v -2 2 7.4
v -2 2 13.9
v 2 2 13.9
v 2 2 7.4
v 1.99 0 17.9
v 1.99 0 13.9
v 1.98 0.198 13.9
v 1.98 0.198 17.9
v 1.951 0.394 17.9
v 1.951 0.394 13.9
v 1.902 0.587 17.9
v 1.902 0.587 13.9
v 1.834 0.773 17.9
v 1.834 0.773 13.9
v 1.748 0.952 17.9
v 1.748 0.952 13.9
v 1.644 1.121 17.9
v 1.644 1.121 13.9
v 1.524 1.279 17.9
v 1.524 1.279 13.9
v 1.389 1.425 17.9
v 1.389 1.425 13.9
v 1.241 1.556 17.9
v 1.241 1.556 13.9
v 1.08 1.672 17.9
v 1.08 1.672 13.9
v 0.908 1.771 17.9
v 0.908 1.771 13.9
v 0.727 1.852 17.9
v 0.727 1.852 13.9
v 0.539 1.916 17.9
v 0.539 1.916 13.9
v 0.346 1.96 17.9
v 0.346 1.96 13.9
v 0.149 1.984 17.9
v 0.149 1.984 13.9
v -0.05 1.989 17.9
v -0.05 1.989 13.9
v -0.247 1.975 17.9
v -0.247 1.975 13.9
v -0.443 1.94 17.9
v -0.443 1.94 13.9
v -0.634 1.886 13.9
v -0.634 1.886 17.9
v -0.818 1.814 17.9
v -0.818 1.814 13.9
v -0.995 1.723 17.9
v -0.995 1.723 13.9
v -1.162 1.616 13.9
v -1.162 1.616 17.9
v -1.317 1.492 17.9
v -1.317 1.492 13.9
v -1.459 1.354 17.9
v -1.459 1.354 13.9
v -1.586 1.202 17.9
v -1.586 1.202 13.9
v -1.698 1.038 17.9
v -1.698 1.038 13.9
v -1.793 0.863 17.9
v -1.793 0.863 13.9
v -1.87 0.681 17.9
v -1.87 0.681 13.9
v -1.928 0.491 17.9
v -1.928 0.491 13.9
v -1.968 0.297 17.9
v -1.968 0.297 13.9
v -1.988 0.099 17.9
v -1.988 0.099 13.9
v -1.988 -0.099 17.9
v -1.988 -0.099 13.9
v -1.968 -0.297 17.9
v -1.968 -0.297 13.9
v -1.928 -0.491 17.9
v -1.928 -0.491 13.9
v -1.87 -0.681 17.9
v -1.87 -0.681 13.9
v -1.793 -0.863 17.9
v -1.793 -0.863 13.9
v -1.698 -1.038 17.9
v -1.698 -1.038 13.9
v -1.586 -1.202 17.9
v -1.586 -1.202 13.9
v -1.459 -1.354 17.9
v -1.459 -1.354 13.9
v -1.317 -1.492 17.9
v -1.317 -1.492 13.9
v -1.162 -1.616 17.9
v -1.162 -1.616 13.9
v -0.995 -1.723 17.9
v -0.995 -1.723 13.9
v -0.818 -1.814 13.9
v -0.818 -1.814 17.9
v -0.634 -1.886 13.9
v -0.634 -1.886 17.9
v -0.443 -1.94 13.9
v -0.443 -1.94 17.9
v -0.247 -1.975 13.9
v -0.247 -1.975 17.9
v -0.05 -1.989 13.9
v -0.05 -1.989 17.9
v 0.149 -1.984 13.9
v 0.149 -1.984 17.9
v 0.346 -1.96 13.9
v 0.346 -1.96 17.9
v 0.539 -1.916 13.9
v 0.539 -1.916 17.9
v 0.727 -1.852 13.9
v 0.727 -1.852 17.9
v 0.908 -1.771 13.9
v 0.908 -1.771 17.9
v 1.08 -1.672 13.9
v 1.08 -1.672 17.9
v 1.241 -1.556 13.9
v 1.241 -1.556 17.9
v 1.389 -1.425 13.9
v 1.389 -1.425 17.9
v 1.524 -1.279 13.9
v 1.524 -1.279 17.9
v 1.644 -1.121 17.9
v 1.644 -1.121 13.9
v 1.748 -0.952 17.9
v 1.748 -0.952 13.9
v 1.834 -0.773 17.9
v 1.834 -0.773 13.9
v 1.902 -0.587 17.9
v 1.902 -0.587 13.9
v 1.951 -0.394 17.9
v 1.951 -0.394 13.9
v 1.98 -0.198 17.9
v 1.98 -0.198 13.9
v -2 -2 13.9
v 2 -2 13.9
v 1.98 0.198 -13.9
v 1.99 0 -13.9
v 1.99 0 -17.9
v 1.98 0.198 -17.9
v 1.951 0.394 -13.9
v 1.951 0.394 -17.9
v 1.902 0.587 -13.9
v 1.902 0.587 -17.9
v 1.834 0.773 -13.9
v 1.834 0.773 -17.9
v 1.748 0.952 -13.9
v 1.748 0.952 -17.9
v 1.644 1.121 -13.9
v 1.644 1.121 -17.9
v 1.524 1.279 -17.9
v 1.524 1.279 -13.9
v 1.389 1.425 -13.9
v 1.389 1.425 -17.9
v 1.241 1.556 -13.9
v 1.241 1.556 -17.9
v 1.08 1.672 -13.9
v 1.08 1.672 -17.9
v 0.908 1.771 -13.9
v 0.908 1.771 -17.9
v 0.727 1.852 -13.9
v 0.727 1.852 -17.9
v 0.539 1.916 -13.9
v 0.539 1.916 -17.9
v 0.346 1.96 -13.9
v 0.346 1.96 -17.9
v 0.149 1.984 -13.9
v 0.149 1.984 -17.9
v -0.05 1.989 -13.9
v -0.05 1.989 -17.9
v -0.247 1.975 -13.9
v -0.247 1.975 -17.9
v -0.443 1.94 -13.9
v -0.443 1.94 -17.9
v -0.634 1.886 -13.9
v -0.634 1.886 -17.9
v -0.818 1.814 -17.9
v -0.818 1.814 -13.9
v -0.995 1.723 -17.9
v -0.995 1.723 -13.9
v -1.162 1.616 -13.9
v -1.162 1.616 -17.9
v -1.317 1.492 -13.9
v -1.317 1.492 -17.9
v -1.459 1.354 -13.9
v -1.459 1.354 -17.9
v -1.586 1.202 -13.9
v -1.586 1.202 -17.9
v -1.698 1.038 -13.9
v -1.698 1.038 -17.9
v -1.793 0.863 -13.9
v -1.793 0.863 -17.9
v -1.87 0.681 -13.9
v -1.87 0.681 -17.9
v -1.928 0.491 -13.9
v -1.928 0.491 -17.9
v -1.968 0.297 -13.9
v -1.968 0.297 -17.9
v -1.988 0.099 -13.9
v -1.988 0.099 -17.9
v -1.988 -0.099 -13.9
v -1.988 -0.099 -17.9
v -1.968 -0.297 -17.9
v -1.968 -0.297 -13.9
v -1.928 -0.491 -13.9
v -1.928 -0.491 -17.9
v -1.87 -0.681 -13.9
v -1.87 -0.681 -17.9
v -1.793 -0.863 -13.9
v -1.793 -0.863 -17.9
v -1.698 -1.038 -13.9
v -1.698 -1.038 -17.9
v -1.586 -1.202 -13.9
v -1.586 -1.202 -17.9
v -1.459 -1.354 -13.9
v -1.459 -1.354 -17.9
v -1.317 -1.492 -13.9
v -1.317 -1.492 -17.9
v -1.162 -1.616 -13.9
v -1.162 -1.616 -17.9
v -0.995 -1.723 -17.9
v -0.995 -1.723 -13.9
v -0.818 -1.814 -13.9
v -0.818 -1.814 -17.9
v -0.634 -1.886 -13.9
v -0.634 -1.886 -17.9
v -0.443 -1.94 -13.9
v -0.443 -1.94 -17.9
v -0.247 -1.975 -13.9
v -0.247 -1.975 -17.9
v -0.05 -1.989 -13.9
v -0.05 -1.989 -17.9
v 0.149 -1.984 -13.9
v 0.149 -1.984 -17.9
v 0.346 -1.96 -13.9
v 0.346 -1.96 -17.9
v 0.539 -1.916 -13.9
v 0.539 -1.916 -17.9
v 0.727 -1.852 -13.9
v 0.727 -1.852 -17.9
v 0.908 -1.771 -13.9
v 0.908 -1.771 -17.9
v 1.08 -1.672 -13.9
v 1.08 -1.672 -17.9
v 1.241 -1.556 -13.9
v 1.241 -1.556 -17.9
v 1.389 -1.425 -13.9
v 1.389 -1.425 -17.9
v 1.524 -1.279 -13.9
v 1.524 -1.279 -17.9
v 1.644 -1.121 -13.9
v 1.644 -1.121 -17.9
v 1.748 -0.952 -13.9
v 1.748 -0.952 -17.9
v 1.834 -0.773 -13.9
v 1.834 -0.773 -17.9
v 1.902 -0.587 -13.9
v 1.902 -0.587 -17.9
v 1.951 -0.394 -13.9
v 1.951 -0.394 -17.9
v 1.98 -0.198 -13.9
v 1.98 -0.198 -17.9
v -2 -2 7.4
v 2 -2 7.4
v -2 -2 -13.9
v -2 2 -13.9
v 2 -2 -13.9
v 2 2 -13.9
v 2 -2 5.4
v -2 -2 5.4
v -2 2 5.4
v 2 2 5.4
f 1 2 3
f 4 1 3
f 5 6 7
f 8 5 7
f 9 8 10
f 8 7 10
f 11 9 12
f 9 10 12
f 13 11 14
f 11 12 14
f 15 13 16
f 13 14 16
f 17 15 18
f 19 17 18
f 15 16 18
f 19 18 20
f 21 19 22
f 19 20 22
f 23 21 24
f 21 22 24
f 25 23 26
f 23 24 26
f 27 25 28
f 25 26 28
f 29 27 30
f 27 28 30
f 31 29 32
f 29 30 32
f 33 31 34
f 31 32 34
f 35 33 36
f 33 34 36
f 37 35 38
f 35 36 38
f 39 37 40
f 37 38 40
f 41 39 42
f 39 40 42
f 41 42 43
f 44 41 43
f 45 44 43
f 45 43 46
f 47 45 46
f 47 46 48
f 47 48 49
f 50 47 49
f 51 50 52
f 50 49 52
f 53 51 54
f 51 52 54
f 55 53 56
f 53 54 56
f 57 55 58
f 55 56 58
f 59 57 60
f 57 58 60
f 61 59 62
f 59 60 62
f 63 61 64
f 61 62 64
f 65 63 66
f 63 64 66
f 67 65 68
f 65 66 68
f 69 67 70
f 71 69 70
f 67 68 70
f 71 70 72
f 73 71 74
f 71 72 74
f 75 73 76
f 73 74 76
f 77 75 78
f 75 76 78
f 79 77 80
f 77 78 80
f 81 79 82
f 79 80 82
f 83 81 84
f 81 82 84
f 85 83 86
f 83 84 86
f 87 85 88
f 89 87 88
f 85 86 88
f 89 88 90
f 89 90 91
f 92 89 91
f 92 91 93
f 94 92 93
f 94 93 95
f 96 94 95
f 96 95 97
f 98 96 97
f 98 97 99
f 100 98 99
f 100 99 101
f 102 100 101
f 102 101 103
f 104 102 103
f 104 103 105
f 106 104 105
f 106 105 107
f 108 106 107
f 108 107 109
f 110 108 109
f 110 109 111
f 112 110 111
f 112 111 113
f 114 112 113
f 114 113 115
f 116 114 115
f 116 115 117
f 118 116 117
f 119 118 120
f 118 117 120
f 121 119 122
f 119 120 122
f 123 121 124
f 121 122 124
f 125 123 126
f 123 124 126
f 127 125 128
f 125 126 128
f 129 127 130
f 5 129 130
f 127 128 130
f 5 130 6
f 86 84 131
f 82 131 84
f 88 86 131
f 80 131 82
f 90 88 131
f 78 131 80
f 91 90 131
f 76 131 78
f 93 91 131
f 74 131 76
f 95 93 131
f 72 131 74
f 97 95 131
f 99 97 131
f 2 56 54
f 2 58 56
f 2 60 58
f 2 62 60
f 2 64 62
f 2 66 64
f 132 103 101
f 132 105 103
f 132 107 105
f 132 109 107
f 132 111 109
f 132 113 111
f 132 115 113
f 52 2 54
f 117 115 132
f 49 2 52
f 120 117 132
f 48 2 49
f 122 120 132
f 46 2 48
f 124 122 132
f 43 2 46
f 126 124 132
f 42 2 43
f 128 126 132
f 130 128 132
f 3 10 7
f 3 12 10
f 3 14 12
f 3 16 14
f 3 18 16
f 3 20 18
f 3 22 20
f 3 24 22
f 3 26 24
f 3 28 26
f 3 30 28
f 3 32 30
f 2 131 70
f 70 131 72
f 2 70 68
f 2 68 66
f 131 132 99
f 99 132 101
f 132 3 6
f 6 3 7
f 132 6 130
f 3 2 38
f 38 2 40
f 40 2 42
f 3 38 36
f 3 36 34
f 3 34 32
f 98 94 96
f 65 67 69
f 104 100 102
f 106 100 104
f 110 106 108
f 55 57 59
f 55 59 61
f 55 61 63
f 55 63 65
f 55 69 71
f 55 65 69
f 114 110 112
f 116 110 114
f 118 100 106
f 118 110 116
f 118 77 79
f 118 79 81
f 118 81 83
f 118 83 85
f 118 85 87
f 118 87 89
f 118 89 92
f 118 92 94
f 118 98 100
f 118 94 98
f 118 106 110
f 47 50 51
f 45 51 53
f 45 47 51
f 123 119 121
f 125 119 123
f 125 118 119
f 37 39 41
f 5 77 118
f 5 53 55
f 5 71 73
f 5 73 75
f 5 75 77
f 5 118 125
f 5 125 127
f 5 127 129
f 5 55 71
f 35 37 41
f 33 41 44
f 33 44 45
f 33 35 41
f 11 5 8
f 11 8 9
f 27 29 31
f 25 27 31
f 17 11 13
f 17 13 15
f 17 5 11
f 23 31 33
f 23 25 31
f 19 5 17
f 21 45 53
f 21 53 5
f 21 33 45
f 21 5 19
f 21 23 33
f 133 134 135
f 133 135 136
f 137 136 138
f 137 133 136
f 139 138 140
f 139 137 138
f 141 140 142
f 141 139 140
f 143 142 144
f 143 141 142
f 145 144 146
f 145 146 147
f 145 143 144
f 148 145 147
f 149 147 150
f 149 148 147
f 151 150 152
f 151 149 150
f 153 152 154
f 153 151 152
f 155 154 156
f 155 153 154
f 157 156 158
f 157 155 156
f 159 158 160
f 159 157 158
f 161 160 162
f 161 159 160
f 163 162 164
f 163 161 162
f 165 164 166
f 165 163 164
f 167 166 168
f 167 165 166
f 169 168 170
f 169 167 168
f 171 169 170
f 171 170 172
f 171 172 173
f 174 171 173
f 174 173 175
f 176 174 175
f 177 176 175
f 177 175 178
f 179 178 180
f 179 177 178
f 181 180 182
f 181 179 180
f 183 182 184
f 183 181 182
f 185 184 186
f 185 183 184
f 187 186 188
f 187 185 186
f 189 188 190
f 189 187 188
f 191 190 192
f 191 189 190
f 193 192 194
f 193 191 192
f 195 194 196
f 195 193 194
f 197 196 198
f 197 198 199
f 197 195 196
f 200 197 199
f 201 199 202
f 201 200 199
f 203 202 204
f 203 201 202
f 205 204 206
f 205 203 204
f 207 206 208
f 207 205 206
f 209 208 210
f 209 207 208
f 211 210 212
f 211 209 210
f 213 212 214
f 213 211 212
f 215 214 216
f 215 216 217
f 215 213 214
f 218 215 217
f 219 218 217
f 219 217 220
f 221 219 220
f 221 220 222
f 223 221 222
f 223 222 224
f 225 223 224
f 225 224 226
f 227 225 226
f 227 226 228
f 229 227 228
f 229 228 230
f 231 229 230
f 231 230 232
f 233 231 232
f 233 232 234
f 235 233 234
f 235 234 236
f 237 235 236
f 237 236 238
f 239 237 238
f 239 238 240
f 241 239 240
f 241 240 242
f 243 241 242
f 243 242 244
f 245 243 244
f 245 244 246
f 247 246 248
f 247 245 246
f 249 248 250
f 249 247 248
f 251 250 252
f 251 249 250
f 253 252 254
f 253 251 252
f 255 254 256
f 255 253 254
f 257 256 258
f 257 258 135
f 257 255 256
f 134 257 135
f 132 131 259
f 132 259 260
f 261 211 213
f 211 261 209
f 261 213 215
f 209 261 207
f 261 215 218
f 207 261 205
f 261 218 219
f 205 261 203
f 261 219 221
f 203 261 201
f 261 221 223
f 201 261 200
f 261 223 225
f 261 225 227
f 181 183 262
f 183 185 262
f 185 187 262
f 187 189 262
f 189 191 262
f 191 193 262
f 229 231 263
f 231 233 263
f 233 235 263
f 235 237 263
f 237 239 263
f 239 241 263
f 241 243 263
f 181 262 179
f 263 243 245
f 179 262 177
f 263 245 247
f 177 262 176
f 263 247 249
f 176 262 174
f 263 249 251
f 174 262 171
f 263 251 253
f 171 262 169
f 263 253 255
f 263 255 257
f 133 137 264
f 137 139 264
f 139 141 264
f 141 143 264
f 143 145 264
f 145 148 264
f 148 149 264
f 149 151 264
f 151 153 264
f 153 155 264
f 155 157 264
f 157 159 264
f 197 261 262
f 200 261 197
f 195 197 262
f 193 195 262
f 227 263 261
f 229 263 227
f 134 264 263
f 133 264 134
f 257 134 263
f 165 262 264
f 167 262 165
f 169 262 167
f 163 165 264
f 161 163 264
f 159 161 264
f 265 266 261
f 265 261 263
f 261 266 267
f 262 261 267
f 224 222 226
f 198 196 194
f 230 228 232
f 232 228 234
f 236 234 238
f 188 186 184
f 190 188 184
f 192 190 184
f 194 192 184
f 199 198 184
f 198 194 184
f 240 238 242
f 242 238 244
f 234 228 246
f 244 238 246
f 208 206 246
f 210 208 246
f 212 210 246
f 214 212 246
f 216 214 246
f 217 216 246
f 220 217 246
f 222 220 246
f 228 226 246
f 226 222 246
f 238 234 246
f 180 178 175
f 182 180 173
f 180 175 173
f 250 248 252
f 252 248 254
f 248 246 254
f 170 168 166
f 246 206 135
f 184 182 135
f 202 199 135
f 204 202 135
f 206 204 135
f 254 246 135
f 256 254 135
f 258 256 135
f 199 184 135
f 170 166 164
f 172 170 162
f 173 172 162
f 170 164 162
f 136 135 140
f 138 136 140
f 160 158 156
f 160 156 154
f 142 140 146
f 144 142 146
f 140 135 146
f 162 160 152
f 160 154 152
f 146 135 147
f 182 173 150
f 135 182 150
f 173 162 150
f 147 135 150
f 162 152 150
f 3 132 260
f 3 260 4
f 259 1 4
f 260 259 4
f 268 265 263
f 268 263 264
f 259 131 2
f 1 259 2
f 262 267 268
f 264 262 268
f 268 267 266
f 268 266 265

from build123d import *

# Parameters (mm, degrees)
SKETCH1_W           = 4
SKETCH1_H           = 4
BOSS_EXTRUDE1_DEPTH = 13.9
SKETCH2_R           = 1.99
BOSS_EXTRUDE2_DEPTH = 4
CUT_EXTRUDE1_REACH  = 20.45
SKETCH3_W           = 4
SKETCH3_H           = 2


with BuildPart() as part:
    # Sketch1 → Boss-Extrude1 (new, symmetric)
    with BuildSketch(Plane.XY):
        Rectangle(SKETCH1_W, SKETCH1_H)
    extrude(amount=BOSS_EXTRUDE1_DEPTH, both=True)

    # Sketch2 → Boss-Extrude2 (add)
    with BuildSketch(Plane.XY.offset(13.9)):
        Circle(SKETCH2_R)
    boss_extrude2 = extrude(amount=BOSS_EXTRUDE2_DEPTH)

    # Mirror2: Boss-Extrude2 across plane
    add(boss_extrude2.mirror(Plane.XY))

    # Sketch3 → Cut-Extrude1 (cut, up to next)
    with BuildSketch(Plane(origin=(0, 2, 0), x_dir=(1, 0, 0), z_dir=(0, 1, 0)), mode=Mode.PRIVATE) as cut_extrude1_sk1:
        with Locations((0, -6.4)):
            Rectangle(SKETCH3_W, SKETCH3_H)
    cut_extrude1_tool1 = extrude(cut_extrude1_sk1.sketch, amount=-CUT_EXTRUDE1_REACH, mode=Mode.PRIVATE) & part.part
    add(cut_extrude1_tool1.solids().sort_by_distance((0, 2, 6.4))[0], mode=Mode.SUBTRACT)


with BuildPart() as cut_extrude1_piece_1:
    # of the separate pieces the step leaves, piece 1, a body of its own (cut_extrude1_pieces)
    add(part.part.solids().sort_by_distance((2, -2, -13.9))[0])


with BuildPart() as cut_extrude1_piece_2:
    # of the separate pieces the step leaves, piece 2, a body of its own (cut_extrude1_pieces)
    add(part.part.solids().sort_by_distance((2, -2, 7.4))[0])


solid = Compound([cut_extrude1_piece_1.part, cut_extrude1_piece_2.part])
